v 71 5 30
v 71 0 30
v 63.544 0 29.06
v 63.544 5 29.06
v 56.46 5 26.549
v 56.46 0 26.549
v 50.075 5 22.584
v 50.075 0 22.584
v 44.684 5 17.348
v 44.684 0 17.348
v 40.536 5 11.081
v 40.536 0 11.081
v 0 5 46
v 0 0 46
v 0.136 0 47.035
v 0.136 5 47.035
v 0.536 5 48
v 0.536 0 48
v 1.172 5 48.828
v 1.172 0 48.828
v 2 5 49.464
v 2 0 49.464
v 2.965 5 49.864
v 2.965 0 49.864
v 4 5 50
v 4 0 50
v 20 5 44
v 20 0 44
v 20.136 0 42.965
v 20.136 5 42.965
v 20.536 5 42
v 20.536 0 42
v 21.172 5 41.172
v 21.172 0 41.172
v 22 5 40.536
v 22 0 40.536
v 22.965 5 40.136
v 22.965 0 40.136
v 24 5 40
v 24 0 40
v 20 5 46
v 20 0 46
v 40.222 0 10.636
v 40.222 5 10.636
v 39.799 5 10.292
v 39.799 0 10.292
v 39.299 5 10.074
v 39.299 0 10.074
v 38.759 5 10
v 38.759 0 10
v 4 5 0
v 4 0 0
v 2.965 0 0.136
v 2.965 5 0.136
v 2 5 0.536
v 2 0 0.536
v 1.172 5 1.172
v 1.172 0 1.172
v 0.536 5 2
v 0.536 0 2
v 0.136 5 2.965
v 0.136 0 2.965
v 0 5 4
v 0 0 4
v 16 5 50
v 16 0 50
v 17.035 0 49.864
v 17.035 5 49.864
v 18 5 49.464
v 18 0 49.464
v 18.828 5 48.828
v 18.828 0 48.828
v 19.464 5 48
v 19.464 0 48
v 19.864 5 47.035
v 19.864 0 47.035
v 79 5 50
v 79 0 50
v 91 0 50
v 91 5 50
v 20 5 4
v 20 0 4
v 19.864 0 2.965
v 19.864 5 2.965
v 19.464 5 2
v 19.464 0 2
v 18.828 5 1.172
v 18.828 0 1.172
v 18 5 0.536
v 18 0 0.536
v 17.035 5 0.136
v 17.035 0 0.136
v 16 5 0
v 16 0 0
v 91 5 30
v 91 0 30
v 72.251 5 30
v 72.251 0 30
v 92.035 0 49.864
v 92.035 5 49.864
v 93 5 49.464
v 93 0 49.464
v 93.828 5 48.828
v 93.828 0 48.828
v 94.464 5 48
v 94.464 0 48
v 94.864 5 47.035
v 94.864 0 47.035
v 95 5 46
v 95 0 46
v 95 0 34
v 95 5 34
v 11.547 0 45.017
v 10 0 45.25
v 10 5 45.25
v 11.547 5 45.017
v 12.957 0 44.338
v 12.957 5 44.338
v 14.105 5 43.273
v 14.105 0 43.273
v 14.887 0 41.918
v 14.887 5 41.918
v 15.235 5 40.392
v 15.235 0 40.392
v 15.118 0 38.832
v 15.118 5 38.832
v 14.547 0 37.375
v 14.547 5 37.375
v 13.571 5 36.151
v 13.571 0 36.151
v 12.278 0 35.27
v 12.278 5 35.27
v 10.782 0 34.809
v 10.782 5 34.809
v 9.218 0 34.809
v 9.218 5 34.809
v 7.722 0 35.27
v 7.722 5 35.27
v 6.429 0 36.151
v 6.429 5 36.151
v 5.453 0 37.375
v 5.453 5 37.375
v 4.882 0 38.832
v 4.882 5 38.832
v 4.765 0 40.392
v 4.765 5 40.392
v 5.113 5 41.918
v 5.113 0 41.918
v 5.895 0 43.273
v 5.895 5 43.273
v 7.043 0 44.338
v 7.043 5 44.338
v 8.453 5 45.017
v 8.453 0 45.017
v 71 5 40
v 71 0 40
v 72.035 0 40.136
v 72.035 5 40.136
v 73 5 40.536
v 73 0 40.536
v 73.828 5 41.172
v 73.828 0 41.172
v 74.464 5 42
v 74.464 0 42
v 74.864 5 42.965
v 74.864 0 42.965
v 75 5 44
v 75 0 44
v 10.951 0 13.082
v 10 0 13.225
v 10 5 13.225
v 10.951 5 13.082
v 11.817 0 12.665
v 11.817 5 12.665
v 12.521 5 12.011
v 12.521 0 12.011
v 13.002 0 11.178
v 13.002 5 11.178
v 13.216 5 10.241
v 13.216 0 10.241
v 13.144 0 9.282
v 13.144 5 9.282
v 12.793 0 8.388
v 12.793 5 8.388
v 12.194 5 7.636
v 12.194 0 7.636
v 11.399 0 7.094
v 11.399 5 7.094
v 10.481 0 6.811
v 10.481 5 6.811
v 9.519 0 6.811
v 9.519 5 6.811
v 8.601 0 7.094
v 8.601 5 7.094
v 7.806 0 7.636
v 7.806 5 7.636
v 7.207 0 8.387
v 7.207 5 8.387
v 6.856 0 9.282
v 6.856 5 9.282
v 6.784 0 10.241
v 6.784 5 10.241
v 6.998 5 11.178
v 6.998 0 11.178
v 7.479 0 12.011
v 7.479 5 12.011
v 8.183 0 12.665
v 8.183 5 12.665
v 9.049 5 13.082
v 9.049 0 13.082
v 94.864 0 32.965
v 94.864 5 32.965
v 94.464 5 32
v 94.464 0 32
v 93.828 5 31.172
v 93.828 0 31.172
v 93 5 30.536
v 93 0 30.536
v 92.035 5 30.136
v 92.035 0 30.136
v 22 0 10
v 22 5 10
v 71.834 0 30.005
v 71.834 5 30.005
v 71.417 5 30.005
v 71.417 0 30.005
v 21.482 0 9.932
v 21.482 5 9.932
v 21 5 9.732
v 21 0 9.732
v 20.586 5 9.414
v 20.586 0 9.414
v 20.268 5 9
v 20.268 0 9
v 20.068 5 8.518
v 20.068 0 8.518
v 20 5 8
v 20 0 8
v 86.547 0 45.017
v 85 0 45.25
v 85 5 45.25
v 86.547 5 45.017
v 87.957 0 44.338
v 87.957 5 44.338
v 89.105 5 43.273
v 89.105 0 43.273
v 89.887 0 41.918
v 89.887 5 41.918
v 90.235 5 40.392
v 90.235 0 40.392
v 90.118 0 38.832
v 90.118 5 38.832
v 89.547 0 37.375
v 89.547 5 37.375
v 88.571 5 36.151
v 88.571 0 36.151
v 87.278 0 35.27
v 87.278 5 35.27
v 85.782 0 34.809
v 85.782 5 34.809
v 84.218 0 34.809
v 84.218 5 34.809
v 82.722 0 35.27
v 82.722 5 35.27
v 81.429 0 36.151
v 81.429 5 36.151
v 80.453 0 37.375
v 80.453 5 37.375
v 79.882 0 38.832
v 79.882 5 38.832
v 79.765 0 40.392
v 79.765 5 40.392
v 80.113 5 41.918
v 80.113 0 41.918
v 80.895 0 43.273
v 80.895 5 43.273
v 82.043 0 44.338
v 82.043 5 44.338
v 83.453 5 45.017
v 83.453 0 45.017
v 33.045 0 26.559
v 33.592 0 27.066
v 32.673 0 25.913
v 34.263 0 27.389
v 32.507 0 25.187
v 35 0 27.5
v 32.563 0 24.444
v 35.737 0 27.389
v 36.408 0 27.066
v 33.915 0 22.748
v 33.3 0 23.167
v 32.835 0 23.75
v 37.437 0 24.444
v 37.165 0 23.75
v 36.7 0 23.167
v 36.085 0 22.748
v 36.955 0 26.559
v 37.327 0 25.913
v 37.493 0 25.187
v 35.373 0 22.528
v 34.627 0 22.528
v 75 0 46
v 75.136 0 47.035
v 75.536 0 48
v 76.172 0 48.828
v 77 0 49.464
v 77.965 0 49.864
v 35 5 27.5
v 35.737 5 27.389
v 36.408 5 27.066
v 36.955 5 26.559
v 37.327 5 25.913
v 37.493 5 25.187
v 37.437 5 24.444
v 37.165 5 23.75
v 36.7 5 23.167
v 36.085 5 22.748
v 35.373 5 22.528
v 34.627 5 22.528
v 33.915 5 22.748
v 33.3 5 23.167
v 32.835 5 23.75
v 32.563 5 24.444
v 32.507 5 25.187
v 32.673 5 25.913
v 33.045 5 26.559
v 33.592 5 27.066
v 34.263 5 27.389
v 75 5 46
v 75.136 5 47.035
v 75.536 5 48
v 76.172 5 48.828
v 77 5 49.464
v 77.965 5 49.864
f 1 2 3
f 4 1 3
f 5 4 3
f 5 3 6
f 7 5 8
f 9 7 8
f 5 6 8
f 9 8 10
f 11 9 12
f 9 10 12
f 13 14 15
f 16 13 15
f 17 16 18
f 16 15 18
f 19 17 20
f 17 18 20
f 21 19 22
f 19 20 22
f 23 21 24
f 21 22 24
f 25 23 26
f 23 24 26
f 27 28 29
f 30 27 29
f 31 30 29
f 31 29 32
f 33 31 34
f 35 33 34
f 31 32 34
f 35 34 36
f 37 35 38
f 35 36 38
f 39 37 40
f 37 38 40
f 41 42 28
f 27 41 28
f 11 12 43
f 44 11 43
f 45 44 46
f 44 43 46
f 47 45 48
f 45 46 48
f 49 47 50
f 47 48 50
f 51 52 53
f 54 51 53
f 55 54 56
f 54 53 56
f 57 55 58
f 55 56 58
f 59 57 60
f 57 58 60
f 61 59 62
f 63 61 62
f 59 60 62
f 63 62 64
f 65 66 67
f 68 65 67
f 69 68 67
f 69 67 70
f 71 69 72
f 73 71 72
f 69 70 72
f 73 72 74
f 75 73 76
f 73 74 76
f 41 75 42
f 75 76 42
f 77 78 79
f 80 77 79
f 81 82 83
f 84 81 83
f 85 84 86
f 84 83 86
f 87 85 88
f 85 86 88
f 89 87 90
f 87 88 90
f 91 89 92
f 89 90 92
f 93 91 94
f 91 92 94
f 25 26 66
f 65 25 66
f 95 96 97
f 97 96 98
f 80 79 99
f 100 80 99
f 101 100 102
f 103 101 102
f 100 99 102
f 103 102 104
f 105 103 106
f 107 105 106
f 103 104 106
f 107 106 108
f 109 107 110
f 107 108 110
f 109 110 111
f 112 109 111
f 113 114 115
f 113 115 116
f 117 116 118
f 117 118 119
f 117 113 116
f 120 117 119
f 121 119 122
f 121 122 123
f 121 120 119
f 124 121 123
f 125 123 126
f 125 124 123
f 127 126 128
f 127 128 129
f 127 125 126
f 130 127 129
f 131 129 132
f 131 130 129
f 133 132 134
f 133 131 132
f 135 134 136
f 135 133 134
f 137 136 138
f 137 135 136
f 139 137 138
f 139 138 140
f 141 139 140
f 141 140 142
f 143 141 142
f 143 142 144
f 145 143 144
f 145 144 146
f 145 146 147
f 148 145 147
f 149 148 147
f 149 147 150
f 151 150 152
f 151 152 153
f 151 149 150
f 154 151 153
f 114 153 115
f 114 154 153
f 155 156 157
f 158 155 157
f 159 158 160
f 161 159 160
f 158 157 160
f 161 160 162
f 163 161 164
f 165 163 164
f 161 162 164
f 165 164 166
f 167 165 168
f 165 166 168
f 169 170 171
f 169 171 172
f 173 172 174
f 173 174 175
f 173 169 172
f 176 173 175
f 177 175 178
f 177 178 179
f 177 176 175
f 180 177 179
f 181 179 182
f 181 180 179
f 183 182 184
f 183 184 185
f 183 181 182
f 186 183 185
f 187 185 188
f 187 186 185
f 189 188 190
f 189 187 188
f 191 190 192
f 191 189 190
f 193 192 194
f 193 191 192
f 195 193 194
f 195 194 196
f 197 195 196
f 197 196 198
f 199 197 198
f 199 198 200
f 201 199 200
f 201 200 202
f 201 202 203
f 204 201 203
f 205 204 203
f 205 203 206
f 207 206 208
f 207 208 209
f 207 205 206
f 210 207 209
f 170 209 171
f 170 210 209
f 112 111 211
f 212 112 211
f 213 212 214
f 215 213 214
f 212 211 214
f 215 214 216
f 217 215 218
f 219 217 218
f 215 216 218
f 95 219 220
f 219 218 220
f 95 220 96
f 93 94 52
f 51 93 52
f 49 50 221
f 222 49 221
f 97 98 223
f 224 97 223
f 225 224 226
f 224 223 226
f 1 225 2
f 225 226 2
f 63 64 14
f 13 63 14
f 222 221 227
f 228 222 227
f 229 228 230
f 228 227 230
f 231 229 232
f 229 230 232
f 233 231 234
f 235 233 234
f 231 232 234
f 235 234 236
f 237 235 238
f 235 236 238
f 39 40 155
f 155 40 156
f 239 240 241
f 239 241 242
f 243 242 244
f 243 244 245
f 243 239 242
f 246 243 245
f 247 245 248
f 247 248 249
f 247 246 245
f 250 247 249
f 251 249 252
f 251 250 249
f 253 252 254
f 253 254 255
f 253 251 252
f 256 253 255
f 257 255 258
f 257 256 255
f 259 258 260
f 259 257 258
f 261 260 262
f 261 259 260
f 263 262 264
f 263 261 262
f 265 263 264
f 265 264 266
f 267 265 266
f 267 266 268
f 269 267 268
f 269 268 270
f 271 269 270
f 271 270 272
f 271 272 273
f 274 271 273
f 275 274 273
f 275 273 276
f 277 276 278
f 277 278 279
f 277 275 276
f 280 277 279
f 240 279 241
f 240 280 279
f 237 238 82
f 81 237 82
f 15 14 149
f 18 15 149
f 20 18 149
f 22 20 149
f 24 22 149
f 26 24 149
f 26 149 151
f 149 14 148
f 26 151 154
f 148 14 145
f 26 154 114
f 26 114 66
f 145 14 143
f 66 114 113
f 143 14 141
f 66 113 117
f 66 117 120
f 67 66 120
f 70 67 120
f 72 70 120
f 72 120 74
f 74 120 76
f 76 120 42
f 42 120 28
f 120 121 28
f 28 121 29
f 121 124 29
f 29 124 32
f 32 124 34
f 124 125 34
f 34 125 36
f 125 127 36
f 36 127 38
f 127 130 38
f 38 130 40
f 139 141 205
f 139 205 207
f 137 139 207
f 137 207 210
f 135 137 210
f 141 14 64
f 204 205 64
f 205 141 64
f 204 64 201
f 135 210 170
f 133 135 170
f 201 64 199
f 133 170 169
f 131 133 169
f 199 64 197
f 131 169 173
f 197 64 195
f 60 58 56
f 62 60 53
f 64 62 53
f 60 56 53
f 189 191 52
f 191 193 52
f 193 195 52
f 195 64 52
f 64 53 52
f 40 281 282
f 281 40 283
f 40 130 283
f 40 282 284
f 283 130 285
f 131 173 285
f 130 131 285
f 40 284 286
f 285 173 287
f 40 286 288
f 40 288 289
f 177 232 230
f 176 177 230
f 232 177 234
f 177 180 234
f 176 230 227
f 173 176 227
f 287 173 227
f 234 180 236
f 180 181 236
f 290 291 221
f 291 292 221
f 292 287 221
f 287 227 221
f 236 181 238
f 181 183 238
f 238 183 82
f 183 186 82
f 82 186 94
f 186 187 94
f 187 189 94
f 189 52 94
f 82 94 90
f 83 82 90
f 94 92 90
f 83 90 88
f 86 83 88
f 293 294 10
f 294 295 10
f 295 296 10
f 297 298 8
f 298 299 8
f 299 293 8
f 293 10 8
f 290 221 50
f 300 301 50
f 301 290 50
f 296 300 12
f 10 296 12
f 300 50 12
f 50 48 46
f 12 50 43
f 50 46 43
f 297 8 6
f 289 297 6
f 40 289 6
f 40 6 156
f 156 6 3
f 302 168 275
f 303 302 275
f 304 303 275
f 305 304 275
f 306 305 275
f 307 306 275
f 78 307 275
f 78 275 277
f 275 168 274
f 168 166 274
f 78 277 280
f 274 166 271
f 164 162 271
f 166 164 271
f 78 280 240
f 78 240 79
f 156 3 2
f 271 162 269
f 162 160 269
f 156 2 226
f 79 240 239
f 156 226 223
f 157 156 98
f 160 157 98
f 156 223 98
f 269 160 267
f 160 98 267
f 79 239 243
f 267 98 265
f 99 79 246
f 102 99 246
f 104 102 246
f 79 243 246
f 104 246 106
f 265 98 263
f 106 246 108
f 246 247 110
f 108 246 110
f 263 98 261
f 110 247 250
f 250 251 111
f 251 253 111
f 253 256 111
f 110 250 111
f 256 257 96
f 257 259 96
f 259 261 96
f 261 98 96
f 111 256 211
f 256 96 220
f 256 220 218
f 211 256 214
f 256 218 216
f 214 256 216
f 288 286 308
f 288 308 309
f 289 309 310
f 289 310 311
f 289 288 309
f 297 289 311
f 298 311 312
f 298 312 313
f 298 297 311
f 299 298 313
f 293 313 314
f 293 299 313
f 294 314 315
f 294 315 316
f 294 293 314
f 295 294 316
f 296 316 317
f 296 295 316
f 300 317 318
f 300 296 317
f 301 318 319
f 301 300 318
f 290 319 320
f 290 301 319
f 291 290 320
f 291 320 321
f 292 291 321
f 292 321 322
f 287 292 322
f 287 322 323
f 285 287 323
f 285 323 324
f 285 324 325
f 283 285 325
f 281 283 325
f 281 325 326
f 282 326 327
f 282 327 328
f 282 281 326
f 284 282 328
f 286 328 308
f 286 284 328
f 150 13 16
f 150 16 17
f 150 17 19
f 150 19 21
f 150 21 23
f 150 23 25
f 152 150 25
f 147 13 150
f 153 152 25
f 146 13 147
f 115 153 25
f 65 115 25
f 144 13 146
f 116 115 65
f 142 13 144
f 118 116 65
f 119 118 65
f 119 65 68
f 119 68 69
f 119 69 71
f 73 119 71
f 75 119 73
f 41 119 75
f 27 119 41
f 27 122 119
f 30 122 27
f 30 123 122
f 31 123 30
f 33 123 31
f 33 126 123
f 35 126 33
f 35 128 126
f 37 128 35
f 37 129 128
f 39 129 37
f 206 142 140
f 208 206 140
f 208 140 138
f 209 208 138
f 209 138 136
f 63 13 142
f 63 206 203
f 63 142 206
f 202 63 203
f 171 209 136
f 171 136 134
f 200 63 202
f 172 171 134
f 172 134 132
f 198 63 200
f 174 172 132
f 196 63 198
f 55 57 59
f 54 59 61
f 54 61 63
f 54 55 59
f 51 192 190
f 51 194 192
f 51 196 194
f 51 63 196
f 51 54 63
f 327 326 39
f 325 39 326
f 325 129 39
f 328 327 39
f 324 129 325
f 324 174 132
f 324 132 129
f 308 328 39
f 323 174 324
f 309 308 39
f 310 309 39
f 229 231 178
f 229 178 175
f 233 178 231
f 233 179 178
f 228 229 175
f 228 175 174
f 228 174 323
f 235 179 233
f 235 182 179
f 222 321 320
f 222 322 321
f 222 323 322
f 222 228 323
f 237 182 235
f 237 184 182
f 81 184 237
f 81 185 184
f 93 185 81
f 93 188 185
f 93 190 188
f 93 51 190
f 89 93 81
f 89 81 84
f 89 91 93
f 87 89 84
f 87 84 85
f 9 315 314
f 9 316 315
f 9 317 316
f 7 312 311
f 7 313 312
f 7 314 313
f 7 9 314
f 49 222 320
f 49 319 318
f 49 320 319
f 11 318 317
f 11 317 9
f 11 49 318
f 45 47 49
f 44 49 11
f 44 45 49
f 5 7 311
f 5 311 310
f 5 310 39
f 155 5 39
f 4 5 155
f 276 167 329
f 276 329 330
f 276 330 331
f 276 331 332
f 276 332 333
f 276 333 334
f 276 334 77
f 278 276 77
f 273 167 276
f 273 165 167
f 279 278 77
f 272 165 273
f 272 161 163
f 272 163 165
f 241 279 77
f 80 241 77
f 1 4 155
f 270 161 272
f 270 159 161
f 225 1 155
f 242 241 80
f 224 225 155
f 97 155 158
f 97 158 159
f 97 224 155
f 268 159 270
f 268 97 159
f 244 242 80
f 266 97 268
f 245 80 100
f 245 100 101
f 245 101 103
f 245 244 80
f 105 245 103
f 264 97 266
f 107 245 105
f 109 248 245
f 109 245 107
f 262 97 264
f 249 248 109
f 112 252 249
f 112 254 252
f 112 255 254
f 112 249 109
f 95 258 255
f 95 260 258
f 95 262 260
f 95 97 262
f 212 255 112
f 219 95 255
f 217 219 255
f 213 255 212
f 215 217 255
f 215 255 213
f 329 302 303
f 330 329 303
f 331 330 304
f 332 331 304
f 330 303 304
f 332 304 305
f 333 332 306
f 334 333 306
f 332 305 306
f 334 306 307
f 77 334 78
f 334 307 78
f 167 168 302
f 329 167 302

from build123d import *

# Parameters (mm, degrees)
SKETCH1_R           = 5.25
SKETCH1_R_2         = 2.5
SKETCH1_R_3         = 3.225
BOSS_EXTRUDE1_DEPTH = 5


with BuildPart() as part:
    # Sketch1 → Boss-Extrude1 (new body)
    with BuildSketch(Plane(origin=(0, 0, 0), x_dir=(1, 0, 0), z_dir=(0, 1, 0))):
        with BuildLine():
            ThreePointArc((4, 0), (1.171572875, -1.171572875), (0, -4))
            Line((0, -4), (0, -46))
            ThreePointArc((0, -46), (1.171572875, -48.828427125), (4, -50))
            Line((4, -50), (16, -50))
            ThreePointArc((16, -50), (18.828427125, -48.828427125), (20, -46))
            Line((20, -46), (20, -44))
            ThreePointArc((20, -44), (21.171572875, -41.171572875), (24, -40))
            Line((24, -40), (71, -40))
            ThreePointArc((71, -40), (73.828427125, -41.171572875), (75, -44))
            Line((75, -44), (75, -46))
            ThreePointArc((75, -46), (76.171572875, -48.828427125), (79, -50))
            Line((79, -50), (91, -50))
            ThreePointArc((91, -50), (93.828427125, -48.828427125), (95, -46))
            Line((95, -46), (95, -34))
            ThreePointArc((95, -34), (93.828427125, -31.171572875), (91, -30))
            Line((91, -30), (72.250853642, -30))
            ThreePointArc((72.250853642, -30), (71.625426821, -30.005588428), (71, -30))
            ThreePointArc((71, -30), (53.160847909, -24.738723573), (40.535736829, -11.081383158))
            ThreePointArc((40.535736829, -11.081383158), (39.799078859, -10.291604015), (38.759183115, -10))
            Line((38.759183115, -10), (22, -10))
            ThreePointArc((22, -10), (20.585786438, -9.414213562), (20, -8))
            Line((20, -8), (20, -4))
            ThreePointArc((20, -4), (18.828427125, -1.171572875), (16, 0))
            Line((16, 0), (4, 0))
        make_face()
        with Locations(Location((10, -40, 0), (0, 0, 270))):
            Circle(SKETCH1_R, mode=Mode.SUBTRACT)
        with Locations(Location((85, -40, 0), (0, 0, 270))):
            Circle(SKETCH1_R, mode=Mode.SUBTRACT)
        with Locations(Location((35, -25, 0), (0, 0, 270))):
            Circle(SKETCH1_R_2, mode=Mode.SUBTRACT)
        with Locations(Location((10, -10, 0), (0, 0, 270))):
            Circle(SKETCH1_R_3, mode=Mode.SUBTRACT)
    extrude(amount=BOSS_EXTRUDE1_DEPTH)


solid = part.part
